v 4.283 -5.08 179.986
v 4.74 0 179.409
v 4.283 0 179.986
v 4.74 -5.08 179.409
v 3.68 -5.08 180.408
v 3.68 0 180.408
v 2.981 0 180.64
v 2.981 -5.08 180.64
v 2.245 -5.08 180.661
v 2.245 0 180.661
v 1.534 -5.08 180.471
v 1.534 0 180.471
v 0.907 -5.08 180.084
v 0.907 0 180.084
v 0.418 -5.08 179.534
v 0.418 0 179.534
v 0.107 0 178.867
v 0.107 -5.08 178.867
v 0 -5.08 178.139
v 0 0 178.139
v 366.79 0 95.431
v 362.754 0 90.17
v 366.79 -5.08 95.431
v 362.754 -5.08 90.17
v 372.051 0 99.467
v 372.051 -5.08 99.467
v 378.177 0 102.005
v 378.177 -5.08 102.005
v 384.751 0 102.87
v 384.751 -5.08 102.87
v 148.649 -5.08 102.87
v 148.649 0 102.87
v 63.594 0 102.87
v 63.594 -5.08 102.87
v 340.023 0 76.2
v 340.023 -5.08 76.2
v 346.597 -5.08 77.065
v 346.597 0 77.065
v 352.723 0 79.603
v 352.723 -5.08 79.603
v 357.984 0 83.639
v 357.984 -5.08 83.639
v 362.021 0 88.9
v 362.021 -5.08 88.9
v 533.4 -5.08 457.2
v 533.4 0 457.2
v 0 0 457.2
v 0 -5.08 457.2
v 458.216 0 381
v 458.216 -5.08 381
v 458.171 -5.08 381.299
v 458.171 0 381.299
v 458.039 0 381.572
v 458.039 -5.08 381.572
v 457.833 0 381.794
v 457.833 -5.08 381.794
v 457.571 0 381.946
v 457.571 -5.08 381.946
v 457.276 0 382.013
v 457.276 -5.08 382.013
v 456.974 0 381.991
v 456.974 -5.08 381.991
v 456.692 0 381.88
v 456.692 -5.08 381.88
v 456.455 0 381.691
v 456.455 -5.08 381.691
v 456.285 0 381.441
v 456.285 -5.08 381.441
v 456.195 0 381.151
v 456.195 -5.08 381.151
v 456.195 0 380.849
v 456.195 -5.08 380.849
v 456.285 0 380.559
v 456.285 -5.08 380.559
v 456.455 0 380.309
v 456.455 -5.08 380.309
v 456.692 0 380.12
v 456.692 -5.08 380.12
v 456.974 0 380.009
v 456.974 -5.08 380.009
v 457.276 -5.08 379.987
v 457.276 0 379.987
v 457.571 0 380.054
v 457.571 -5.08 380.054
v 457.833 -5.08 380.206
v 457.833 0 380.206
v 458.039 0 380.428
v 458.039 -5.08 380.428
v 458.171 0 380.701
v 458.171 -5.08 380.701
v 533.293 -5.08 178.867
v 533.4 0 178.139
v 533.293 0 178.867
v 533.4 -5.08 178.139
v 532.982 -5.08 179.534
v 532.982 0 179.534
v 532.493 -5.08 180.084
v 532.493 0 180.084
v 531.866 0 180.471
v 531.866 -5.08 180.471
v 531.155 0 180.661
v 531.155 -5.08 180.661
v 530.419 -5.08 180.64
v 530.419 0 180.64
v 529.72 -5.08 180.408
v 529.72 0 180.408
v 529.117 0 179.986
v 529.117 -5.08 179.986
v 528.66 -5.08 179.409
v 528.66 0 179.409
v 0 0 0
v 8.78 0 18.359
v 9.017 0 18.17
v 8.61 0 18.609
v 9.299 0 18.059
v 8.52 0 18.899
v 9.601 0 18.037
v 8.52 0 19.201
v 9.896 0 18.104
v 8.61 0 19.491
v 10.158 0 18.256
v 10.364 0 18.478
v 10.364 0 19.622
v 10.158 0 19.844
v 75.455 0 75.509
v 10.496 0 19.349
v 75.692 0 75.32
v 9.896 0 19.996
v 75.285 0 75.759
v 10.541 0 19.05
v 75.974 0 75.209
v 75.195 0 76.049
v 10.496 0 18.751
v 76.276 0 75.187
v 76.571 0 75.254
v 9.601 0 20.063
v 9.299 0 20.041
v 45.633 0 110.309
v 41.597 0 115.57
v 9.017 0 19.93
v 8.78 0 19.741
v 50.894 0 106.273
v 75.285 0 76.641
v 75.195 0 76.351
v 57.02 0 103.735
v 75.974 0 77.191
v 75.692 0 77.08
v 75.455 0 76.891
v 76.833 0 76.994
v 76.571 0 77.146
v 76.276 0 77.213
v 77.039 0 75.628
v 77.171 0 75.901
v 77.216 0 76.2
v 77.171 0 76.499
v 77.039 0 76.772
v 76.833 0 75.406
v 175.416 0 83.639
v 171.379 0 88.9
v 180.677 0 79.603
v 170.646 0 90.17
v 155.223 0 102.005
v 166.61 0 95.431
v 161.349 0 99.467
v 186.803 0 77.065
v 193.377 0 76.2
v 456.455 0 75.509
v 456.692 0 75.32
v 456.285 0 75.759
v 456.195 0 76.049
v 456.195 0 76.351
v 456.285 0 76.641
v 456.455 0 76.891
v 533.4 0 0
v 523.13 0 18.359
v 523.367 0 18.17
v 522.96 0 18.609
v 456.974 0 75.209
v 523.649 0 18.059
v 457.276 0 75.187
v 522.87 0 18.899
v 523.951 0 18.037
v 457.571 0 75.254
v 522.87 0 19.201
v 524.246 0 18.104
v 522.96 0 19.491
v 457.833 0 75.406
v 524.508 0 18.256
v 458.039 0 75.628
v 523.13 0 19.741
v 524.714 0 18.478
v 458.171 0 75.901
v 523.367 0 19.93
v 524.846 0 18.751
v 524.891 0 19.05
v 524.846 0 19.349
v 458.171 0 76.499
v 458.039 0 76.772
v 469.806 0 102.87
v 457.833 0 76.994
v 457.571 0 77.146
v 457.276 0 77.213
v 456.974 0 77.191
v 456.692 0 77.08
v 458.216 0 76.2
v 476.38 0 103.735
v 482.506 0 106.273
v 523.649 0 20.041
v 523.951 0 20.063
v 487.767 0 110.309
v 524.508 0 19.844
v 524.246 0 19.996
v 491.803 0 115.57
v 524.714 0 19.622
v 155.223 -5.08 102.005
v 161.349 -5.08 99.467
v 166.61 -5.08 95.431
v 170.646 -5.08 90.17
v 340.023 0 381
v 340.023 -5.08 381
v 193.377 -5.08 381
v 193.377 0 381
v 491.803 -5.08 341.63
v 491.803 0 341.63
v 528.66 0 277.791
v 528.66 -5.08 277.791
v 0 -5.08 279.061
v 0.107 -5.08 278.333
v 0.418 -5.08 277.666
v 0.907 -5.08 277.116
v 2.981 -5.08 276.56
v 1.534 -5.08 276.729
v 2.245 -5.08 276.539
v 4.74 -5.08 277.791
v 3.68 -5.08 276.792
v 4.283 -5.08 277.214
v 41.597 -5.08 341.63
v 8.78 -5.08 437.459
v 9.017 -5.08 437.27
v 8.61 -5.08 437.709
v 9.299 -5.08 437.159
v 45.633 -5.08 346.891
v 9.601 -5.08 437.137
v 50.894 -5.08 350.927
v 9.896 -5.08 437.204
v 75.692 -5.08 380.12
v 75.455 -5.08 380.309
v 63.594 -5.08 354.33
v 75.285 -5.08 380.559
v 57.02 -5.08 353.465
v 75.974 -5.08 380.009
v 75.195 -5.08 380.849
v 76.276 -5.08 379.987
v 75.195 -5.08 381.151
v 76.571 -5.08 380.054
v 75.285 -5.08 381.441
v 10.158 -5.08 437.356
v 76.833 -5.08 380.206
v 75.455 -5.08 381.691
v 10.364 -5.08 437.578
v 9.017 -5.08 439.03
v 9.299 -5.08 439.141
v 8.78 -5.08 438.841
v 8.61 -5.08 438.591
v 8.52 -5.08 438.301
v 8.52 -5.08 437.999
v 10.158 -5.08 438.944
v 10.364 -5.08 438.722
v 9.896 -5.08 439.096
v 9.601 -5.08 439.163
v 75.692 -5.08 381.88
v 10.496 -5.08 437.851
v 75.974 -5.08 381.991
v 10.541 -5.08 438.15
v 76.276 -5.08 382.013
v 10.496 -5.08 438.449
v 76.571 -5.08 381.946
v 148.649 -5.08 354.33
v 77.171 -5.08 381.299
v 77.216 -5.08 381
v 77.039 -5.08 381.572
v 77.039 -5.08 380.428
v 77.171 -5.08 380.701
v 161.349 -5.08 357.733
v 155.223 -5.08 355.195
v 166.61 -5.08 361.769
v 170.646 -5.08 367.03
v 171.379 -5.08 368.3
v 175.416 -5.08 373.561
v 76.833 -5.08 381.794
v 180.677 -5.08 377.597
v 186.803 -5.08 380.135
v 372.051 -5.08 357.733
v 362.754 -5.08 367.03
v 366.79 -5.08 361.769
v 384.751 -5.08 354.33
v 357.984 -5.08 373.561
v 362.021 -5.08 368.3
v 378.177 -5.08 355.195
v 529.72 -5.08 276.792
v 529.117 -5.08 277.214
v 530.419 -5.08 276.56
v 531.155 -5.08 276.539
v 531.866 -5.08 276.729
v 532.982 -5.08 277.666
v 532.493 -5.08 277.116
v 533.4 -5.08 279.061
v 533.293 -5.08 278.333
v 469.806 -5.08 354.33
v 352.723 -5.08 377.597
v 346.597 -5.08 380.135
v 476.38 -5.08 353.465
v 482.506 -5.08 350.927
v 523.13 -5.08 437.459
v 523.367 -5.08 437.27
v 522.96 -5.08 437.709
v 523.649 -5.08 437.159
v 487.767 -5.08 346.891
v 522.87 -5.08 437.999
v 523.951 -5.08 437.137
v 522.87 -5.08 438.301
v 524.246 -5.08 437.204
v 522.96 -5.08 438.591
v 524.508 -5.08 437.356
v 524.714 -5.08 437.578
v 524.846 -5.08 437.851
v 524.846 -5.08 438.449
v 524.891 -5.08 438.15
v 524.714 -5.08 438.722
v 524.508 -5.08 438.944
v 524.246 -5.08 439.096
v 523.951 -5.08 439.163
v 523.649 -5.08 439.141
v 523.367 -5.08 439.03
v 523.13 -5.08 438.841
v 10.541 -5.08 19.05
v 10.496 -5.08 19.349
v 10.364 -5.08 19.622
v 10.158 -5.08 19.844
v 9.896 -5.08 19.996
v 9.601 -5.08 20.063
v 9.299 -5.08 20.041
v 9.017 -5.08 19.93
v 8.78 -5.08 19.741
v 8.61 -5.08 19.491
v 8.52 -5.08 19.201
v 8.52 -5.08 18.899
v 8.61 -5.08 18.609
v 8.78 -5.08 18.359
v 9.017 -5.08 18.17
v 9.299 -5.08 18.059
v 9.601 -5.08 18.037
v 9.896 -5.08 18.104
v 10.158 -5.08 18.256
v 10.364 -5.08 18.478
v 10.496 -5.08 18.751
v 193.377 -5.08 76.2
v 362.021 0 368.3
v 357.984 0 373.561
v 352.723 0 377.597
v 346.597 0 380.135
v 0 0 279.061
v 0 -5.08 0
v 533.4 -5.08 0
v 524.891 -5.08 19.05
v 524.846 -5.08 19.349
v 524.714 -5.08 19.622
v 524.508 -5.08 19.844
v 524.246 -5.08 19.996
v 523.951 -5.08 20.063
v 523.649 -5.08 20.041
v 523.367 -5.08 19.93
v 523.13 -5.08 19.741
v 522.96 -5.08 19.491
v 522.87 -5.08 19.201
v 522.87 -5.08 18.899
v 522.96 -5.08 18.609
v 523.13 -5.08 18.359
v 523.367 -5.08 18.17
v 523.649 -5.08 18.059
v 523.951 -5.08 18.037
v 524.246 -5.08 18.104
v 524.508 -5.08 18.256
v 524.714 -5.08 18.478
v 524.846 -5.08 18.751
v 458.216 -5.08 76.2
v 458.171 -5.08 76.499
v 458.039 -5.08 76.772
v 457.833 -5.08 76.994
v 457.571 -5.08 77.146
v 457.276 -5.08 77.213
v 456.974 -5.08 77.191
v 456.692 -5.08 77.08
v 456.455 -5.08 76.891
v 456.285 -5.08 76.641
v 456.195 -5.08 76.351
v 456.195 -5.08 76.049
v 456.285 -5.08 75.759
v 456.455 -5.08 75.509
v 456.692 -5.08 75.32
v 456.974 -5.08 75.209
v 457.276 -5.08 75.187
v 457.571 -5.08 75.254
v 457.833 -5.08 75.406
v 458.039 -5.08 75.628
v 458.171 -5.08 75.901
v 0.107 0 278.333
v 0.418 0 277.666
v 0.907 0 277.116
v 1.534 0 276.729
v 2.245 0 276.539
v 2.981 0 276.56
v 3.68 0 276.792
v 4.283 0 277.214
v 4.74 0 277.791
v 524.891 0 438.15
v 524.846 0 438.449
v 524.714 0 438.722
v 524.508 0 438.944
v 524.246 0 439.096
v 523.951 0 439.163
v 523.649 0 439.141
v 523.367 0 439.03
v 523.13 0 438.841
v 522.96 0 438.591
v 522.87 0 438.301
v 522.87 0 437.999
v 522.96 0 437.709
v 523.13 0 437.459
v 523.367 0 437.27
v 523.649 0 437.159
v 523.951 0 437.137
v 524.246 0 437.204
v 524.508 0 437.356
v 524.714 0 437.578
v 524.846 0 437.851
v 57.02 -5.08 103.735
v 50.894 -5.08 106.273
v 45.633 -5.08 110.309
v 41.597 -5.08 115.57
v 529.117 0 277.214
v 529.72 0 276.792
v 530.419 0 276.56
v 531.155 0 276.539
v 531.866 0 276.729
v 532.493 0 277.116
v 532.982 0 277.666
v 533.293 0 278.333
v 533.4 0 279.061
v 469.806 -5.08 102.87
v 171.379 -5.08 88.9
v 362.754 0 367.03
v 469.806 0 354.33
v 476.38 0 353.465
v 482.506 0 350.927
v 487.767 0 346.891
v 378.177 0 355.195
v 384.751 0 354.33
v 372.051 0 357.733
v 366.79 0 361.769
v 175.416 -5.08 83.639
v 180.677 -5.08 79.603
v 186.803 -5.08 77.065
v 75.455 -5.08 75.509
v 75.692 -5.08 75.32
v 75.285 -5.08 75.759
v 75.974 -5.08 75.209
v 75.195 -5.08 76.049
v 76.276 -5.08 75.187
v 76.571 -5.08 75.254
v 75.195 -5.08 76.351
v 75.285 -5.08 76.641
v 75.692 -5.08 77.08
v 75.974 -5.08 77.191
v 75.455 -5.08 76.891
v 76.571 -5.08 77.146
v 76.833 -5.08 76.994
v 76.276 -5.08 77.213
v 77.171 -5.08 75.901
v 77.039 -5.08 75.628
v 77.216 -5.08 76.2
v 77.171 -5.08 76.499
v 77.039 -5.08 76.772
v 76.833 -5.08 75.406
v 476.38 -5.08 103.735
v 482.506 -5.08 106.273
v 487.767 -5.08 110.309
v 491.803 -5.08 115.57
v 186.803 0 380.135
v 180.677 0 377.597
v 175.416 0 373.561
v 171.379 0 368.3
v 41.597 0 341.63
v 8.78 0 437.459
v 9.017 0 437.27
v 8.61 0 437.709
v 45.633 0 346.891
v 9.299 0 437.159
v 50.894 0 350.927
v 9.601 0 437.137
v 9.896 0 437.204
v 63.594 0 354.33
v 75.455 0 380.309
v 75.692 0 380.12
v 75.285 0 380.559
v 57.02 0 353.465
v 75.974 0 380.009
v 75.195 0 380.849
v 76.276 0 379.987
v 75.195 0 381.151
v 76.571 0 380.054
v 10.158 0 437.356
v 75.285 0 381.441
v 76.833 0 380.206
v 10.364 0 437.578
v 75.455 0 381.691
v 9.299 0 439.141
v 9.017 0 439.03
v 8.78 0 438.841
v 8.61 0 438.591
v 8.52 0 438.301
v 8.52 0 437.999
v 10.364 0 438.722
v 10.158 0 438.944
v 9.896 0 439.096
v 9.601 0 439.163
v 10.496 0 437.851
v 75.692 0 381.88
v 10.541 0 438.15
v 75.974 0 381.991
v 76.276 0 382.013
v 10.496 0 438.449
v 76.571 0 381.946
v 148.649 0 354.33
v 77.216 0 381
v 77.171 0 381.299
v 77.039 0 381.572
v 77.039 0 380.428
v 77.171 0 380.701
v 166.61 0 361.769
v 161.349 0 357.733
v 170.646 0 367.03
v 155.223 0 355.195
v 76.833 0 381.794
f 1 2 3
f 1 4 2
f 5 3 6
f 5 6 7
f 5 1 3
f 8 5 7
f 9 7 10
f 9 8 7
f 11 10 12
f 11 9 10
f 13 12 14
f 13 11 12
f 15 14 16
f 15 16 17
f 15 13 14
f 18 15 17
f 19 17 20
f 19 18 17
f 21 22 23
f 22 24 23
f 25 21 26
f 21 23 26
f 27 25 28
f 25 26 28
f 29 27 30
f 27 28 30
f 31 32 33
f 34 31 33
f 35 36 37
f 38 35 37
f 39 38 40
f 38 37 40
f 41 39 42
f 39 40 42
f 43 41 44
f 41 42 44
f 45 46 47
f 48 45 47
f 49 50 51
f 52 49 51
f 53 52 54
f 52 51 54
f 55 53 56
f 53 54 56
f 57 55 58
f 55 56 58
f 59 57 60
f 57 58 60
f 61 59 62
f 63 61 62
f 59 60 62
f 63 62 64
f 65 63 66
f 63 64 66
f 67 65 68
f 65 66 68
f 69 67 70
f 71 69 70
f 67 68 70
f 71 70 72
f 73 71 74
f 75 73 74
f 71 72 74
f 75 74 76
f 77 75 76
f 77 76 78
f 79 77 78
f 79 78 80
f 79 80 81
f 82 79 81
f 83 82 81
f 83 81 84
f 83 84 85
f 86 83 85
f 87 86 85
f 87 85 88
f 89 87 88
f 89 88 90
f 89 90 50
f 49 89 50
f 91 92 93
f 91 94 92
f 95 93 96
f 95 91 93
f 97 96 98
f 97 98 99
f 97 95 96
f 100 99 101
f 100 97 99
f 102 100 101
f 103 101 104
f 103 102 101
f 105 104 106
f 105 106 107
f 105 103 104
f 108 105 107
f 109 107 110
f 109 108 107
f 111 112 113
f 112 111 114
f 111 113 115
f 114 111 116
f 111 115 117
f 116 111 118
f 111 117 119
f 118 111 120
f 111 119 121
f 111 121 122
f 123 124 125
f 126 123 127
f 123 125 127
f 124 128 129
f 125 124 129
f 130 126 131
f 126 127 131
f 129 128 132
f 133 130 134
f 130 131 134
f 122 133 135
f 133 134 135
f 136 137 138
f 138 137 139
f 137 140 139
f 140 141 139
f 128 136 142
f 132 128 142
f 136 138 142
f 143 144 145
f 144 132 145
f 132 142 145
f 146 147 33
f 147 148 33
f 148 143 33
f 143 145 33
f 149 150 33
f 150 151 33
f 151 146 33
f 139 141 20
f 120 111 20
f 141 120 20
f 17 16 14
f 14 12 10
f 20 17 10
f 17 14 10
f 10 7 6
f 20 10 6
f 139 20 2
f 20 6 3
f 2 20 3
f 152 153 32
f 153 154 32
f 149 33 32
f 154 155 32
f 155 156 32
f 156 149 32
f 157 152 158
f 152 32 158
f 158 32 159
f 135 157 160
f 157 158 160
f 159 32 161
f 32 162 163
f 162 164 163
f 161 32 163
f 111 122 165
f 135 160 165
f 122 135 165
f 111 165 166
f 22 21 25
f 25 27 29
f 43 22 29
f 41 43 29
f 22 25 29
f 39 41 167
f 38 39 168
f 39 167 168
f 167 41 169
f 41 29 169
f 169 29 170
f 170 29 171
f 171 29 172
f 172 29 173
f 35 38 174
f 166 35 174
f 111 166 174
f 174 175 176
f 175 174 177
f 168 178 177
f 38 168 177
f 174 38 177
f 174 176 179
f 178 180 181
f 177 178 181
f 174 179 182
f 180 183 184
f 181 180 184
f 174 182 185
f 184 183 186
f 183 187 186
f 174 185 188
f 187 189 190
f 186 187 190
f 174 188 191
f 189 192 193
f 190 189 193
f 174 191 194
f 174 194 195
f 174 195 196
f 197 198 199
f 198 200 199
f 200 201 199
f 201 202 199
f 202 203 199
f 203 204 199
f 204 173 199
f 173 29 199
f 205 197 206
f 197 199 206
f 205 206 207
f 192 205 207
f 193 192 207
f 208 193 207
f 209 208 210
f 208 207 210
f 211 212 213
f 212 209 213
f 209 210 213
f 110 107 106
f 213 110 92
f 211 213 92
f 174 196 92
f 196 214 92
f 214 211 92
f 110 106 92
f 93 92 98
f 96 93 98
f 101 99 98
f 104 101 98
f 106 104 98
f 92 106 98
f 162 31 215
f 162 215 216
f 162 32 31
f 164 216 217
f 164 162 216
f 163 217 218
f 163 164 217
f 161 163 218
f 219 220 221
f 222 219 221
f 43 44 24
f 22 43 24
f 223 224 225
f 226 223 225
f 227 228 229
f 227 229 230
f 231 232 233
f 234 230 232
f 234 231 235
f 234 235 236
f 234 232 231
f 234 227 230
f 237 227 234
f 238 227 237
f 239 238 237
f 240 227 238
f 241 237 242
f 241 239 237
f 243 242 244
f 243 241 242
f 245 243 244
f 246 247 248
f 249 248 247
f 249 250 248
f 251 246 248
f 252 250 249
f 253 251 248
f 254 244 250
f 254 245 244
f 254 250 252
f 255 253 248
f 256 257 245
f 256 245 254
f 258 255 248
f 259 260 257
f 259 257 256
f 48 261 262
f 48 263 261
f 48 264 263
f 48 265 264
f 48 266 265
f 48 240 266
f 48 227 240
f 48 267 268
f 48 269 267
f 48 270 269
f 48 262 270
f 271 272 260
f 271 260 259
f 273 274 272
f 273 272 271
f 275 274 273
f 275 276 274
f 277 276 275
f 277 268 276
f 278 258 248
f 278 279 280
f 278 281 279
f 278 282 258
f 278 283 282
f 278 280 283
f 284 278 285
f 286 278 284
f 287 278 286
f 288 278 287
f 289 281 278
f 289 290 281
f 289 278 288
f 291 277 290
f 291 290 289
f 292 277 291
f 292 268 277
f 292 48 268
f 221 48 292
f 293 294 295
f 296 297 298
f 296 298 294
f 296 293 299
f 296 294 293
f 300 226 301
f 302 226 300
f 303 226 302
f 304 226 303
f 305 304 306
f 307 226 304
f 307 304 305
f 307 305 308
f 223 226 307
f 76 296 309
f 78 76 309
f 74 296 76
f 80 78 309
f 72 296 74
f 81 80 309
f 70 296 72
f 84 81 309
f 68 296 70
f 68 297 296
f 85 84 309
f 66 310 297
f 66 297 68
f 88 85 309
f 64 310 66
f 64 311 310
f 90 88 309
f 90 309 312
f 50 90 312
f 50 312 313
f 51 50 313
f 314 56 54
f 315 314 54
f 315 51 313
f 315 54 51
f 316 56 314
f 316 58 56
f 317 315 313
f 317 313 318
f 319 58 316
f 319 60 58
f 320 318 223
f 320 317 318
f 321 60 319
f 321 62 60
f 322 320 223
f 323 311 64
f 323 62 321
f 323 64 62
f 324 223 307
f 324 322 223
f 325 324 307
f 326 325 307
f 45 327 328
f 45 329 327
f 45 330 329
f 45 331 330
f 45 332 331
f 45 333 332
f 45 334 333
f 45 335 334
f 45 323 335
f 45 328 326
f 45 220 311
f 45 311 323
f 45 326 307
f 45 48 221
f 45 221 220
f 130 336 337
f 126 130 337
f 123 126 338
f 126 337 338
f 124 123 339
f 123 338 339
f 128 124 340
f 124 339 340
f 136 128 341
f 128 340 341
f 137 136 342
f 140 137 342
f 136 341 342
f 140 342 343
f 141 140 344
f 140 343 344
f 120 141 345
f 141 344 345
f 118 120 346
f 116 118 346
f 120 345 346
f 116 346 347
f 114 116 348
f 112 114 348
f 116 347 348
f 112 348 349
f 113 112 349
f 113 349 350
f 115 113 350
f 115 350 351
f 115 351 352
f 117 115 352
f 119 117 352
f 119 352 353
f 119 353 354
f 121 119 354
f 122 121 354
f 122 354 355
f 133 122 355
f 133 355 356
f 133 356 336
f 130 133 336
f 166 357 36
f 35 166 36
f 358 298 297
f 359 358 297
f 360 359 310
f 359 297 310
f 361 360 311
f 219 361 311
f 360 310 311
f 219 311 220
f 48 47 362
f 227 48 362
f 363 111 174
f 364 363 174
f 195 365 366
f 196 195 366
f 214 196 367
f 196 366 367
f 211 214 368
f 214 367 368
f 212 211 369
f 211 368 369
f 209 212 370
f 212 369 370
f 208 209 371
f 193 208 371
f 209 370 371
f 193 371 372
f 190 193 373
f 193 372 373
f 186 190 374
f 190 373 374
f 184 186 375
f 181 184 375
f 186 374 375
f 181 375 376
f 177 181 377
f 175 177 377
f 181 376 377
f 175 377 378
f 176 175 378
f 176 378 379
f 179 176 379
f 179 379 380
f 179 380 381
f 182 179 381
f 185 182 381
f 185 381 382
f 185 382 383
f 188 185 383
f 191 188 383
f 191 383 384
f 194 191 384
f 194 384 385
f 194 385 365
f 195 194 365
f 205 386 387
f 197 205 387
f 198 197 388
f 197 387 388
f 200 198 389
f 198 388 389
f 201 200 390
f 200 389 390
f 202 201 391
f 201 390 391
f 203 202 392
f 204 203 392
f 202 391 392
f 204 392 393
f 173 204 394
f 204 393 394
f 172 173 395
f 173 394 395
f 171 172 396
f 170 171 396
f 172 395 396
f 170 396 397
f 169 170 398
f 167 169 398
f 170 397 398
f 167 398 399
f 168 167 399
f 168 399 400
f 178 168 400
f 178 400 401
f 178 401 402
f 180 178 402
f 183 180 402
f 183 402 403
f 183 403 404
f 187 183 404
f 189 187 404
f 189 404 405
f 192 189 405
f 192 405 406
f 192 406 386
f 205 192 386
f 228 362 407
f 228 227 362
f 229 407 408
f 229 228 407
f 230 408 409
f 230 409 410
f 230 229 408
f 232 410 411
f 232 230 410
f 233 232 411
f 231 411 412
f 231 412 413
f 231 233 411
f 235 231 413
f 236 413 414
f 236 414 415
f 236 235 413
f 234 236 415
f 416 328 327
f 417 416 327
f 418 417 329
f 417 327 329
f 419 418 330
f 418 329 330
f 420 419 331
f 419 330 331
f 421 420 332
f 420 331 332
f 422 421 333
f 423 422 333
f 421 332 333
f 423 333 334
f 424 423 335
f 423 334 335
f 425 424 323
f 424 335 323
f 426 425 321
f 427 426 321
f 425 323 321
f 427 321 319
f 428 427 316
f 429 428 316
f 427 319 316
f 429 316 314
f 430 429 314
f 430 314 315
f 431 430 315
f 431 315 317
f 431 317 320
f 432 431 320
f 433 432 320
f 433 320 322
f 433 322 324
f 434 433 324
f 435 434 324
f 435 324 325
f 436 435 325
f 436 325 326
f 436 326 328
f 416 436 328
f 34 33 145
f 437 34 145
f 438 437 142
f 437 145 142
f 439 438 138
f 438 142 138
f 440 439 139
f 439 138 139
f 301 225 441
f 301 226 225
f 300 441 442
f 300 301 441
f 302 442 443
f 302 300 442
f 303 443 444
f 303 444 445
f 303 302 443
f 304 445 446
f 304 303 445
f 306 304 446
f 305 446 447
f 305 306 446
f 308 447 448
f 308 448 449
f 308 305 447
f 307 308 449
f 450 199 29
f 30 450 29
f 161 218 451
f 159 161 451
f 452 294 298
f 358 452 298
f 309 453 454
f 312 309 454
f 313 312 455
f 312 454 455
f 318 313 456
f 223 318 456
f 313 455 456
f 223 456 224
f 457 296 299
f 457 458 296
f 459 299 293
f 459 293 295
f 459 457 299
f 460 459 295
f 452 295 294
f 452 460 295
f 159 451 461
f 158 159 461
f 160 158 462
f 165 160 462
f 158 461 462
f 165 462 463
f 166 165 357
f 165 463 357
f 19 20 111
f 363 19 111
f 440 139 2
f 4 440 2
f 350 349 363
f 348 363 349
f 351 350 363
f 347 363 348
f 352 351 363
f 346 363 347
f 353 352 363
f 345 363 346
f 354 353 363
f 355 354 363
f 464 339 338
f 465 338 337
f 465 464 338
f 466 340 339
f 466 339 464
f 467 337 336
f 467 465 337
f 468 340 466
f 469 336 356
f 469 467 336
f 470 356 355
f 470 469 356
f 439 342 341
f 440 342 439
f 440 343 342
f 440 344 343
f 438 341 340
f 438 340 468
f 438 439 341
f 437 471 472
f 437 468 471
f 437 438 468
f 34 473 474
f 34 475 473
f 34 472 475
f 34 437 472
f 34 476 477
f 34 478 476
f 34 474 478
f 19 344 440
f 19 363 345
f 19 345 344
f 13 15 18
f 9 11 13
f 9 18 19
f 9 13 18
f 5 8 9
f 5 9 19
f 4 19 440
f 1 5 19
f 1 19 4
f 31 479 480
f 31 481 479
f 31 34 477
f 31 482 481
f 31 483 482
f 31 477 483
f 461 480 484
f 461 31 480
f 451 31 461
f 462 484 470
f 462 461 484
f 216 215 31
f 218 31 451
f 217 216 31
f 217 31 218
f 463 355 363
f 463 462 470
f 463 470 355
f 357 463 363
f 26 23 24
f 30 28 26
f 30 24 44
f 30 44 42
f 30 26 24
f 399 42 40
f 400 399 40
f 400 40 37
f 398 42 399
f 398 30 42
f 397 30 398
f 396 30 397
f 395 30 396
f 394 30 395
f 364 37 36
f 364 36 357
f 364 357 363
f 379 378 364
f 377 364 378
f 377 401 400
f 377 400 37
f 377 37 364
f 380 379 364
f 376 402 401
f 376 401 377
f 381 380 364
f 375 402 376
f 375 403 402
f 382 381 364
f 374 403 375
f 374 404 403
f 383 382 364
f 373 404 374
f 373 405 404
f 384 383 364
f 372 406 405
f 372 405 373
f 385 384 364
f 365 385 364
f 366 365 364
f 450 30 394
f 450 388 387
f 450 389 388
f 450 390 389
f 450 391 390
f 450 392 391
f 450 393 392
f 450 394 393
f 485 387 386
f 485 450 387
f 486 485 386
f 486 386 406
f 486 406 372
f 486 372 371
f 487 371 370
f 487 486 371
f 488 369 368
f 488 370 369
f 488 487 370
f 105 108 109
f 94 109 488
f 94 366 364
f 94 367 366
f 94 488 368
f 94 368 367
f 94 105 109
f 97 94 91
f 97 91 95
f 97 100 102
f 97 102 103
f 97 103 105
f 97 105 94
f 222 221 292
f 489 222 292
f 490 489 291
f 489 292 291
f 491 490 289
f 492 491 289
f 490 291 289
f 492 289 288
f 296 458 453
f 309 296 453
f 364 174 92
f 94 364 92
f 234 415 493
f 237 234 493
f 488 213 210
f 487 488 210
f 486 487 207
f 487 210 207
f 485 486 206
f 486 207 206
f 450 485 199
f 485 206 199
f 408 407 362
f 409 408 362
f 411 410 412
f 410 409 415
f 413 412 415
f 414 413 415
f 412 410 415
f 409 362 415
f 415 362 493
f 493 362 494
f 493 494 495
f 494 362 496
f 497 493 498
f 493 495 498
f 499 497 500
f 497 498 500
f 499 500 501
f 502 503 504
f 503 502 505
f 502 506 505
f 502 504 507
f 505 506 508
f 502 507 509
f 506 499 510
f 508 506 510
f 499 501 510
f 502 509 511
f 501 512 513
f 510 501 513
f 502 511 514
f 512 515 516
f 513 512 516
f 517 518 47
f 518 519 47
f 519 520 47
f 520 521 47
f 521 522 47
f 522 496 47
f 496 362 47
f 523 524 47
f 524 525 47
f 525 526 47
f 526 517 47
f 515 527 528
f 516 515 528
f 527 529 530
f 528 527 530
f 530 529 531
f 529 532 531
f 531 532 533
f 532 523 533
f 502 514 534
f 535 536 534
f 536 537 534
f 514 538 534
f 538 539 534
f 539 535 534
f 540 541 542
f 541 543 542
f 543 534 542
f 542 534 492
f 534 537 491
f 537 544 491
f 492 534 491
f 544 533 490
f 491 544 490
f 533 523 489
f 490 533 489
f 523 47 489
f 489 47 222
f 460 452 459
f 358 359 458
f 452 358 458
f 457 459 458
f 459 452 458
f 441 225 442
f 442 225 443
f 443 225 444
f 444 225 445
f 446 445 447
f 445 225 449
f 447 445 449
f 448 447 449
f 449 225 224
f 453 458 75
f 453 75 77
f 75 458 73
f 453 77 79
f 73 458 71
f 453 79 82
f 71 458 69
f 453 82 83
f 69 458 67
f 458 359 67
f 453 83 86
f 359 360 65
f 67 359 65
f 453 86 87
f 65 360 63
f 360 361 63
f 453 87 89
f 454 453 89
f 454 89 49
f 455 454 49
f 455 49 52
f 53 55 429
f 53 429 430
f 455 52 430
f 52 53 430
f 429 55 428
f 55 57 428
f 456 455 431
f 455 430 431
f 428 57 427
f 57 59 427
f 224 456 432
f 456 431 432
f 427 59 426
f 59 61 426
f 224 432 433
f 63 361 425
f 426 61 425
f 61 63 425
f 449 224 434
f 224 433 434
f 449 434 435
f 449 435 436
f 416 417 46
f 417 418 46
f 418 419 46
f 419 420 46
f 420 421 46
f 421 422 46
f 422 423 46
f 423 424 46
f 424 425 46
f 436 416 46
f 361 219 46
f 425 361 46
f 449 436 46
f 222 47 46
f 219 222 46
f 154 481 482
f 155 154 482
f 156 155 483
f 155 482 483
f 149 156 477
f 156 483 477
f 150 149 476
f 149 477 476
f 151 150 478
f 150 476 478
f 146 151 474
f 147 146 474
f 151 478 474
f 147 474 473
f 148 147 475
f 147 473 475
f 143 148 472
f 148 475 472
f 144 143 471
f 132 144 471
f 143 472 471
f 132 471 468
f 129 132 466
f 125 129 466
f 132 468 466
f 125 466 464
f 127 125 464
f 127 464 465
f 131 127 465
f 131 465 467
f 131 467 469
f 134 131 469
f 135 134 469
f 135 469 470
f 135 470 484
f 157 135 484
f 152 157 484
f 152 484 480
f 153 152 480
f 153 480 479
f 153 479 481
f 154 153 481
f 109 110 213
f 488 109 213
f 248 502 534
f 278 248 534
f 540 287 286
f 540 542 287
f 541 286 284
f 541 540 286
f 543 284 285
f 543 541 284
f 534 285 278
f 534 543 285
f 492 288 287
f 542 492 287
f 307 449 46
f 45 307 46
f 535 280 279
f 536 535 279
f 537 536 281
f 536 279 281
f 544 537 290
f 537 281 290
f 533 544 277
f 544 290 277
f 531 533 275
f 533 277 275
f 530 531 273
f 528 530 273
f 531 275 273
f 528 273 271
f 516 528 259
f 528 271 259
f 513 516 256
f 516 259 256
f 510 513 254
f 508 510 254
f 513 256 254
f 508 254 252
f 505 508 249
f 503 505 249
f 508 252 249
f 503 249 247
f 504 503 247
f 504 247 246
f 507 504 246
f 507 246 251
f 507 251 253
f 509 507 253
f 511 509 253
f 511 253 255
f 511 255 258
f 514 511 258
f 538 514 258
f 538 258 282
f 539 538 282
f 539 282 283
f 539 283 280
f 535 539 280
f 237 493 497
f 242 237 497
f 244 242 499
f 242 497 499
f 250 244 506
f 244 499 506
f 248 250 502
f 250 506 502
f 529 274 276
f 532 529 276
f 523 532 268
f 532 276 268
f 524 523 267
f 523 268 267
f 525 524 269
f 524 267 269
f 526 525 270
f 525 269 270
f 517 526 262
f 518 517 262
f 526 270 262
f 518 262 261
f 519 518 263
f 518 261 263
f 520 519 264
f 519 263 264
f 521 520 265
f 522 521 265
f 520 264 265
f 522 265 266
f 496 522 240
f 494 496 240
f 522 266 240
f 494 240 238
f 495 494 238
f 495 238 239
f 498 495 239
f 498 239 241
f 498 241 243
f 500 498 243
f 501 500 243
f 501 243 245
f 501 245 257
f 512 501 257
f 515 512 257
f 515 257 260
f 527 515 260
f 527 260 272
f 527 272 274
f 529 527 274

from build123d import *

# Parameters (mm, degrees)
F1_DEPTH = 5.08
F2_R     = 1.016
F3_DEPTH = 5.081
F4_R     = 1.016
F5_DEPTH = 5.081
F7_DEPTH = 5.081
F8_R     = 25.4
F8_2_R   = 25.4
F9_R     = 2.54
F9_2_R   = 2.54


with BuildPart() as f1:
    # F0 (on Front) → F1 (new body)
    with BuildSketch(Plane.XZ):
        with BuildLine():
            Line((0, 187.6179503786), (0, 0))
            Line((0, 0), (533.4, 0))
            Line((533.4, 0), (533.4, 187.6179503786))
            Line((533.4, 187.6179503786), (491.8030964543, 115.57))
            ThreePointArc((491.8030964543, 115.57), (482.5060511982, 106.2729547439), (469.8060511982, 102.87))
            Line((469.8060511982, 102.87), (339.2902493452, 102.87))
            Line((339.2902493452, 102.87), (194.1097506548, 102.87))
            Line((194.1097506548, 102.87), (63.5939488018, 102.87))
            ThreePointArc((63.5939488018, 102.87), (50.8939488018, 106.2729547439), (41.5969035457, 115.57))
            Line((41.5969035457, 115.57), (0, 187.6179503786))
        make_face()
    extrude(amount=F1_DEPTH)


with BuildPart() as f1b:
    # F0 (on Front) → F1, piece 2 (new body)
    with BuildSketch(Plane.XZ):
        with BuildLine():
            Line((0, 457.2), (0, 269.5820496214))
            Line((0, 269.5820496214), (41.5969035457, 341.63))
            ThreePointArc((41.5969035457, 341.63), (50.8939488018, 350.9270452561), (63.5939488018, 354.33))
            Line((63.5939488018, 354.33), (194.1097506548, 354.33))
            Line((194.1097506548, 354.33), (339.2902493452, 354.33))
            Line((339.2902493452, 354.33), (469.8060511982, 354.33))
            ThreePointArc((469.8060511982, 354.33), (482.5060511982, 350.9270452561), (491.8030964543, 341.63))
            Line((491.8030964543, 341.63), (533.4, 269.5820496214))
            Line((533.4, 269.5820496214), (533.4, 457.2))
            Line((533.4, 457.2), (0, 457.2))
        make_face()
    extrude(amount=F1_DEPTH)


with BuildPart() as f3_tool:
    # F2 (on face) → F3 (new body, through all)
    with BuildSketch(Plane.XZ.offset(5.08)):
        with Locations((9.525, 438.15)):
            Circle(F2_R)
        with Locations((523.875, 438.15)):
            Circle(F2_R)
        with Locations((523.875, 19.05)):
            Circle(F2_R)
        with Locations((9.525, 19.05)):
            Circle(F2_R)
    extrude(amount=-F3_DEPTH)


with BuildPart() as f1_1:
    add(f1.part)

    # F3: cut by f3_tool
    add(f3_tool.part, mode=Mode.SUBTRACT)


with BuildPart() as f1b_1:
    add(f1b.part)

    # F3: cut by f3_tool
    add(f3_tool.part, mode=Mode.SUBTRACT)


with BuildPart() as f5_tool:
    # F4 (on face) → F5 (new body, through all)
    with BuildSketch(Plane.XZ.offset(5.08)):
        with Locations((76.2, 381)):
            Circle(F4_R)
        with Locations((457.2, 76.2)):
            Circle(F4_R)
        with Locations((457.2, 381)):
            Circle(F4_R)
        with Locations((76.2, 76.2)):
            Circle(F4_R)
    extrude(amount=-F5_DEPTH)


with BuildPart() as f1_2:
    add(f1_1.part)

    # F5: cut by f5_tool
    add(f5_tool.part, mode=Mode.SUBTRACT)


with BuildPart() as f1b_2:
    add(f1b_1.part)

    # F5: cut by f5_tool
    add(f5_tool.part, mode=Mode.SUBTRACT)


with BuildPart() as f7_tool:
    # F6 (on face) → F7 (new body, through all)
    with BuildSketch(Plane.XZ.offset(5.08)):
        Polygon((413.3469683742, 228.6), (340.756719029, 354.33), (192.643280971, 354.33), (120.0530316258, 228.6), (193.3765158129, 101.6), (340.0234841871, 101.6), align=None)
        Polygon((340.756719029, 354.33), (340.0234841871, 355.6), (193.3765158129, 355.6), (192.643280971, 354.33), align=None)
        with BuildLine():
            Line((193.3765158129, 355.6), (340.0234841871, 355.6))
            Line((340.0234841871, 355.6), (340.756719029, 354.33))
            Line((340.756719029, 354.33), (370.0861127038, 354.33))
            Line((370.0861127038, 354.33), (362.0205294432, 368.3))
            ThreePointArc((362.0205294432, 368.3), (352.7234841871, 377.5970452561), (340.0234841871, 381))
            Line((340.0234841871, 381), (193.3765158129, 381))
            ThreePointArc((193.3765158129, 381), (180.6765158129, 377.5970452561), (171.3794705568, 368.3))
            Line((171.3794705568, 368.3), (163.3138872962, 354.33))
            Line((163.3138872962, 354.33), (192.643280971, 354.33))
            Line((192.643280971, 354.33), (193.3765158129, 355.6))
        make_face()
        with BuildLine():
            Line((370.0861127038, 354.33), (340.756719029, 354.33))
            Line((340.756719029, 354.33), (413.3469683742, 228.6))
            Line((413.3469683742, 228.6), (340.0234841871, 101.6))
            Line((340.0234841871, 101.6), (193.3765158129, 101.6))
            Line((193.3765158129, 101.6), (120.0530316258, 228.6))
            Line((120.0530316258, 228.6), (192.643280971, 354.33))
            Line((192.643280971, 354.33), (163.3138872962, 354.33))
            Line((163.3138872962, 354.33), (90.723637951, 228.6))
            Line((90.723637951, 228.6), (171.3794705568, 88.9))
            ThreePointArc((171.3794705568, 88.9), (180.6765158129, 79.6029547439), (193.3765158129, 76.2))
            Line((193.3765158129, 76.2), (340.0234841871, 76.2))
            ThreePointArc((340.0234841871, 76.2), (352.7234841871, 79.6029547439), (362.0205294432, 88.9))
            Line((362.0205294432, 88.9), (442.676362049, 228.6))
            Line((442.676362049, 228.6), (370.0861127038, 354.33))
        make_face()
    extrude(amount=-F7_DEPTH)


with BuildPart() as f1_3:
    add(f1_2.part)

    # F7: cut by f7_tool
    add(f7_tool.part, mode=Mode.SUBTRACT)

    # F8#2
    f8_2_edges = [f1_3.edges().sort_by_distance(p)[0] for p in [
        (163.313887, -2.54, 102.87),
        (370.086113, -2.54, 102.87),
    ]]
    fillet(f8_2_edges, radius=F8_2_R)

    # F9#2
    f9_2_edges = [f1_3.edges().sort_by_distance(p)[0] for p in [
        (0, -2.54, 187.61795),
        (533.4, -2.54, 187.61795),
    ]]
    fillet(f9_2_edges, radius=F9_2_R)


with BuildPart() as f1b_3:
    add(f1b_2.part)

    # F7: cut by f7_tool
    add(f7_tool.part, mode=Mode.SUBTRACT)

    # F8
    f8_edges = [f1b_3.edges().sort_by_distance(p)[0] for p in [
        (163.313887, -2.54, 354.33),
        (370.086113, -2.54, 354.33),
    ]]
    fillet(f8_edges, radius=F8_R)

    # F9
    f9_edges = [f1b_3.edges().sort_by_distance(p)[0] for p in [
        (0, -2.54, 269.58205),
        (533.4, -2.54, 269.58205),
    ]]
    fillet(f9_edges, radius=F9_R)


solid = Compound([f1_3.part, f1b_3.part])
